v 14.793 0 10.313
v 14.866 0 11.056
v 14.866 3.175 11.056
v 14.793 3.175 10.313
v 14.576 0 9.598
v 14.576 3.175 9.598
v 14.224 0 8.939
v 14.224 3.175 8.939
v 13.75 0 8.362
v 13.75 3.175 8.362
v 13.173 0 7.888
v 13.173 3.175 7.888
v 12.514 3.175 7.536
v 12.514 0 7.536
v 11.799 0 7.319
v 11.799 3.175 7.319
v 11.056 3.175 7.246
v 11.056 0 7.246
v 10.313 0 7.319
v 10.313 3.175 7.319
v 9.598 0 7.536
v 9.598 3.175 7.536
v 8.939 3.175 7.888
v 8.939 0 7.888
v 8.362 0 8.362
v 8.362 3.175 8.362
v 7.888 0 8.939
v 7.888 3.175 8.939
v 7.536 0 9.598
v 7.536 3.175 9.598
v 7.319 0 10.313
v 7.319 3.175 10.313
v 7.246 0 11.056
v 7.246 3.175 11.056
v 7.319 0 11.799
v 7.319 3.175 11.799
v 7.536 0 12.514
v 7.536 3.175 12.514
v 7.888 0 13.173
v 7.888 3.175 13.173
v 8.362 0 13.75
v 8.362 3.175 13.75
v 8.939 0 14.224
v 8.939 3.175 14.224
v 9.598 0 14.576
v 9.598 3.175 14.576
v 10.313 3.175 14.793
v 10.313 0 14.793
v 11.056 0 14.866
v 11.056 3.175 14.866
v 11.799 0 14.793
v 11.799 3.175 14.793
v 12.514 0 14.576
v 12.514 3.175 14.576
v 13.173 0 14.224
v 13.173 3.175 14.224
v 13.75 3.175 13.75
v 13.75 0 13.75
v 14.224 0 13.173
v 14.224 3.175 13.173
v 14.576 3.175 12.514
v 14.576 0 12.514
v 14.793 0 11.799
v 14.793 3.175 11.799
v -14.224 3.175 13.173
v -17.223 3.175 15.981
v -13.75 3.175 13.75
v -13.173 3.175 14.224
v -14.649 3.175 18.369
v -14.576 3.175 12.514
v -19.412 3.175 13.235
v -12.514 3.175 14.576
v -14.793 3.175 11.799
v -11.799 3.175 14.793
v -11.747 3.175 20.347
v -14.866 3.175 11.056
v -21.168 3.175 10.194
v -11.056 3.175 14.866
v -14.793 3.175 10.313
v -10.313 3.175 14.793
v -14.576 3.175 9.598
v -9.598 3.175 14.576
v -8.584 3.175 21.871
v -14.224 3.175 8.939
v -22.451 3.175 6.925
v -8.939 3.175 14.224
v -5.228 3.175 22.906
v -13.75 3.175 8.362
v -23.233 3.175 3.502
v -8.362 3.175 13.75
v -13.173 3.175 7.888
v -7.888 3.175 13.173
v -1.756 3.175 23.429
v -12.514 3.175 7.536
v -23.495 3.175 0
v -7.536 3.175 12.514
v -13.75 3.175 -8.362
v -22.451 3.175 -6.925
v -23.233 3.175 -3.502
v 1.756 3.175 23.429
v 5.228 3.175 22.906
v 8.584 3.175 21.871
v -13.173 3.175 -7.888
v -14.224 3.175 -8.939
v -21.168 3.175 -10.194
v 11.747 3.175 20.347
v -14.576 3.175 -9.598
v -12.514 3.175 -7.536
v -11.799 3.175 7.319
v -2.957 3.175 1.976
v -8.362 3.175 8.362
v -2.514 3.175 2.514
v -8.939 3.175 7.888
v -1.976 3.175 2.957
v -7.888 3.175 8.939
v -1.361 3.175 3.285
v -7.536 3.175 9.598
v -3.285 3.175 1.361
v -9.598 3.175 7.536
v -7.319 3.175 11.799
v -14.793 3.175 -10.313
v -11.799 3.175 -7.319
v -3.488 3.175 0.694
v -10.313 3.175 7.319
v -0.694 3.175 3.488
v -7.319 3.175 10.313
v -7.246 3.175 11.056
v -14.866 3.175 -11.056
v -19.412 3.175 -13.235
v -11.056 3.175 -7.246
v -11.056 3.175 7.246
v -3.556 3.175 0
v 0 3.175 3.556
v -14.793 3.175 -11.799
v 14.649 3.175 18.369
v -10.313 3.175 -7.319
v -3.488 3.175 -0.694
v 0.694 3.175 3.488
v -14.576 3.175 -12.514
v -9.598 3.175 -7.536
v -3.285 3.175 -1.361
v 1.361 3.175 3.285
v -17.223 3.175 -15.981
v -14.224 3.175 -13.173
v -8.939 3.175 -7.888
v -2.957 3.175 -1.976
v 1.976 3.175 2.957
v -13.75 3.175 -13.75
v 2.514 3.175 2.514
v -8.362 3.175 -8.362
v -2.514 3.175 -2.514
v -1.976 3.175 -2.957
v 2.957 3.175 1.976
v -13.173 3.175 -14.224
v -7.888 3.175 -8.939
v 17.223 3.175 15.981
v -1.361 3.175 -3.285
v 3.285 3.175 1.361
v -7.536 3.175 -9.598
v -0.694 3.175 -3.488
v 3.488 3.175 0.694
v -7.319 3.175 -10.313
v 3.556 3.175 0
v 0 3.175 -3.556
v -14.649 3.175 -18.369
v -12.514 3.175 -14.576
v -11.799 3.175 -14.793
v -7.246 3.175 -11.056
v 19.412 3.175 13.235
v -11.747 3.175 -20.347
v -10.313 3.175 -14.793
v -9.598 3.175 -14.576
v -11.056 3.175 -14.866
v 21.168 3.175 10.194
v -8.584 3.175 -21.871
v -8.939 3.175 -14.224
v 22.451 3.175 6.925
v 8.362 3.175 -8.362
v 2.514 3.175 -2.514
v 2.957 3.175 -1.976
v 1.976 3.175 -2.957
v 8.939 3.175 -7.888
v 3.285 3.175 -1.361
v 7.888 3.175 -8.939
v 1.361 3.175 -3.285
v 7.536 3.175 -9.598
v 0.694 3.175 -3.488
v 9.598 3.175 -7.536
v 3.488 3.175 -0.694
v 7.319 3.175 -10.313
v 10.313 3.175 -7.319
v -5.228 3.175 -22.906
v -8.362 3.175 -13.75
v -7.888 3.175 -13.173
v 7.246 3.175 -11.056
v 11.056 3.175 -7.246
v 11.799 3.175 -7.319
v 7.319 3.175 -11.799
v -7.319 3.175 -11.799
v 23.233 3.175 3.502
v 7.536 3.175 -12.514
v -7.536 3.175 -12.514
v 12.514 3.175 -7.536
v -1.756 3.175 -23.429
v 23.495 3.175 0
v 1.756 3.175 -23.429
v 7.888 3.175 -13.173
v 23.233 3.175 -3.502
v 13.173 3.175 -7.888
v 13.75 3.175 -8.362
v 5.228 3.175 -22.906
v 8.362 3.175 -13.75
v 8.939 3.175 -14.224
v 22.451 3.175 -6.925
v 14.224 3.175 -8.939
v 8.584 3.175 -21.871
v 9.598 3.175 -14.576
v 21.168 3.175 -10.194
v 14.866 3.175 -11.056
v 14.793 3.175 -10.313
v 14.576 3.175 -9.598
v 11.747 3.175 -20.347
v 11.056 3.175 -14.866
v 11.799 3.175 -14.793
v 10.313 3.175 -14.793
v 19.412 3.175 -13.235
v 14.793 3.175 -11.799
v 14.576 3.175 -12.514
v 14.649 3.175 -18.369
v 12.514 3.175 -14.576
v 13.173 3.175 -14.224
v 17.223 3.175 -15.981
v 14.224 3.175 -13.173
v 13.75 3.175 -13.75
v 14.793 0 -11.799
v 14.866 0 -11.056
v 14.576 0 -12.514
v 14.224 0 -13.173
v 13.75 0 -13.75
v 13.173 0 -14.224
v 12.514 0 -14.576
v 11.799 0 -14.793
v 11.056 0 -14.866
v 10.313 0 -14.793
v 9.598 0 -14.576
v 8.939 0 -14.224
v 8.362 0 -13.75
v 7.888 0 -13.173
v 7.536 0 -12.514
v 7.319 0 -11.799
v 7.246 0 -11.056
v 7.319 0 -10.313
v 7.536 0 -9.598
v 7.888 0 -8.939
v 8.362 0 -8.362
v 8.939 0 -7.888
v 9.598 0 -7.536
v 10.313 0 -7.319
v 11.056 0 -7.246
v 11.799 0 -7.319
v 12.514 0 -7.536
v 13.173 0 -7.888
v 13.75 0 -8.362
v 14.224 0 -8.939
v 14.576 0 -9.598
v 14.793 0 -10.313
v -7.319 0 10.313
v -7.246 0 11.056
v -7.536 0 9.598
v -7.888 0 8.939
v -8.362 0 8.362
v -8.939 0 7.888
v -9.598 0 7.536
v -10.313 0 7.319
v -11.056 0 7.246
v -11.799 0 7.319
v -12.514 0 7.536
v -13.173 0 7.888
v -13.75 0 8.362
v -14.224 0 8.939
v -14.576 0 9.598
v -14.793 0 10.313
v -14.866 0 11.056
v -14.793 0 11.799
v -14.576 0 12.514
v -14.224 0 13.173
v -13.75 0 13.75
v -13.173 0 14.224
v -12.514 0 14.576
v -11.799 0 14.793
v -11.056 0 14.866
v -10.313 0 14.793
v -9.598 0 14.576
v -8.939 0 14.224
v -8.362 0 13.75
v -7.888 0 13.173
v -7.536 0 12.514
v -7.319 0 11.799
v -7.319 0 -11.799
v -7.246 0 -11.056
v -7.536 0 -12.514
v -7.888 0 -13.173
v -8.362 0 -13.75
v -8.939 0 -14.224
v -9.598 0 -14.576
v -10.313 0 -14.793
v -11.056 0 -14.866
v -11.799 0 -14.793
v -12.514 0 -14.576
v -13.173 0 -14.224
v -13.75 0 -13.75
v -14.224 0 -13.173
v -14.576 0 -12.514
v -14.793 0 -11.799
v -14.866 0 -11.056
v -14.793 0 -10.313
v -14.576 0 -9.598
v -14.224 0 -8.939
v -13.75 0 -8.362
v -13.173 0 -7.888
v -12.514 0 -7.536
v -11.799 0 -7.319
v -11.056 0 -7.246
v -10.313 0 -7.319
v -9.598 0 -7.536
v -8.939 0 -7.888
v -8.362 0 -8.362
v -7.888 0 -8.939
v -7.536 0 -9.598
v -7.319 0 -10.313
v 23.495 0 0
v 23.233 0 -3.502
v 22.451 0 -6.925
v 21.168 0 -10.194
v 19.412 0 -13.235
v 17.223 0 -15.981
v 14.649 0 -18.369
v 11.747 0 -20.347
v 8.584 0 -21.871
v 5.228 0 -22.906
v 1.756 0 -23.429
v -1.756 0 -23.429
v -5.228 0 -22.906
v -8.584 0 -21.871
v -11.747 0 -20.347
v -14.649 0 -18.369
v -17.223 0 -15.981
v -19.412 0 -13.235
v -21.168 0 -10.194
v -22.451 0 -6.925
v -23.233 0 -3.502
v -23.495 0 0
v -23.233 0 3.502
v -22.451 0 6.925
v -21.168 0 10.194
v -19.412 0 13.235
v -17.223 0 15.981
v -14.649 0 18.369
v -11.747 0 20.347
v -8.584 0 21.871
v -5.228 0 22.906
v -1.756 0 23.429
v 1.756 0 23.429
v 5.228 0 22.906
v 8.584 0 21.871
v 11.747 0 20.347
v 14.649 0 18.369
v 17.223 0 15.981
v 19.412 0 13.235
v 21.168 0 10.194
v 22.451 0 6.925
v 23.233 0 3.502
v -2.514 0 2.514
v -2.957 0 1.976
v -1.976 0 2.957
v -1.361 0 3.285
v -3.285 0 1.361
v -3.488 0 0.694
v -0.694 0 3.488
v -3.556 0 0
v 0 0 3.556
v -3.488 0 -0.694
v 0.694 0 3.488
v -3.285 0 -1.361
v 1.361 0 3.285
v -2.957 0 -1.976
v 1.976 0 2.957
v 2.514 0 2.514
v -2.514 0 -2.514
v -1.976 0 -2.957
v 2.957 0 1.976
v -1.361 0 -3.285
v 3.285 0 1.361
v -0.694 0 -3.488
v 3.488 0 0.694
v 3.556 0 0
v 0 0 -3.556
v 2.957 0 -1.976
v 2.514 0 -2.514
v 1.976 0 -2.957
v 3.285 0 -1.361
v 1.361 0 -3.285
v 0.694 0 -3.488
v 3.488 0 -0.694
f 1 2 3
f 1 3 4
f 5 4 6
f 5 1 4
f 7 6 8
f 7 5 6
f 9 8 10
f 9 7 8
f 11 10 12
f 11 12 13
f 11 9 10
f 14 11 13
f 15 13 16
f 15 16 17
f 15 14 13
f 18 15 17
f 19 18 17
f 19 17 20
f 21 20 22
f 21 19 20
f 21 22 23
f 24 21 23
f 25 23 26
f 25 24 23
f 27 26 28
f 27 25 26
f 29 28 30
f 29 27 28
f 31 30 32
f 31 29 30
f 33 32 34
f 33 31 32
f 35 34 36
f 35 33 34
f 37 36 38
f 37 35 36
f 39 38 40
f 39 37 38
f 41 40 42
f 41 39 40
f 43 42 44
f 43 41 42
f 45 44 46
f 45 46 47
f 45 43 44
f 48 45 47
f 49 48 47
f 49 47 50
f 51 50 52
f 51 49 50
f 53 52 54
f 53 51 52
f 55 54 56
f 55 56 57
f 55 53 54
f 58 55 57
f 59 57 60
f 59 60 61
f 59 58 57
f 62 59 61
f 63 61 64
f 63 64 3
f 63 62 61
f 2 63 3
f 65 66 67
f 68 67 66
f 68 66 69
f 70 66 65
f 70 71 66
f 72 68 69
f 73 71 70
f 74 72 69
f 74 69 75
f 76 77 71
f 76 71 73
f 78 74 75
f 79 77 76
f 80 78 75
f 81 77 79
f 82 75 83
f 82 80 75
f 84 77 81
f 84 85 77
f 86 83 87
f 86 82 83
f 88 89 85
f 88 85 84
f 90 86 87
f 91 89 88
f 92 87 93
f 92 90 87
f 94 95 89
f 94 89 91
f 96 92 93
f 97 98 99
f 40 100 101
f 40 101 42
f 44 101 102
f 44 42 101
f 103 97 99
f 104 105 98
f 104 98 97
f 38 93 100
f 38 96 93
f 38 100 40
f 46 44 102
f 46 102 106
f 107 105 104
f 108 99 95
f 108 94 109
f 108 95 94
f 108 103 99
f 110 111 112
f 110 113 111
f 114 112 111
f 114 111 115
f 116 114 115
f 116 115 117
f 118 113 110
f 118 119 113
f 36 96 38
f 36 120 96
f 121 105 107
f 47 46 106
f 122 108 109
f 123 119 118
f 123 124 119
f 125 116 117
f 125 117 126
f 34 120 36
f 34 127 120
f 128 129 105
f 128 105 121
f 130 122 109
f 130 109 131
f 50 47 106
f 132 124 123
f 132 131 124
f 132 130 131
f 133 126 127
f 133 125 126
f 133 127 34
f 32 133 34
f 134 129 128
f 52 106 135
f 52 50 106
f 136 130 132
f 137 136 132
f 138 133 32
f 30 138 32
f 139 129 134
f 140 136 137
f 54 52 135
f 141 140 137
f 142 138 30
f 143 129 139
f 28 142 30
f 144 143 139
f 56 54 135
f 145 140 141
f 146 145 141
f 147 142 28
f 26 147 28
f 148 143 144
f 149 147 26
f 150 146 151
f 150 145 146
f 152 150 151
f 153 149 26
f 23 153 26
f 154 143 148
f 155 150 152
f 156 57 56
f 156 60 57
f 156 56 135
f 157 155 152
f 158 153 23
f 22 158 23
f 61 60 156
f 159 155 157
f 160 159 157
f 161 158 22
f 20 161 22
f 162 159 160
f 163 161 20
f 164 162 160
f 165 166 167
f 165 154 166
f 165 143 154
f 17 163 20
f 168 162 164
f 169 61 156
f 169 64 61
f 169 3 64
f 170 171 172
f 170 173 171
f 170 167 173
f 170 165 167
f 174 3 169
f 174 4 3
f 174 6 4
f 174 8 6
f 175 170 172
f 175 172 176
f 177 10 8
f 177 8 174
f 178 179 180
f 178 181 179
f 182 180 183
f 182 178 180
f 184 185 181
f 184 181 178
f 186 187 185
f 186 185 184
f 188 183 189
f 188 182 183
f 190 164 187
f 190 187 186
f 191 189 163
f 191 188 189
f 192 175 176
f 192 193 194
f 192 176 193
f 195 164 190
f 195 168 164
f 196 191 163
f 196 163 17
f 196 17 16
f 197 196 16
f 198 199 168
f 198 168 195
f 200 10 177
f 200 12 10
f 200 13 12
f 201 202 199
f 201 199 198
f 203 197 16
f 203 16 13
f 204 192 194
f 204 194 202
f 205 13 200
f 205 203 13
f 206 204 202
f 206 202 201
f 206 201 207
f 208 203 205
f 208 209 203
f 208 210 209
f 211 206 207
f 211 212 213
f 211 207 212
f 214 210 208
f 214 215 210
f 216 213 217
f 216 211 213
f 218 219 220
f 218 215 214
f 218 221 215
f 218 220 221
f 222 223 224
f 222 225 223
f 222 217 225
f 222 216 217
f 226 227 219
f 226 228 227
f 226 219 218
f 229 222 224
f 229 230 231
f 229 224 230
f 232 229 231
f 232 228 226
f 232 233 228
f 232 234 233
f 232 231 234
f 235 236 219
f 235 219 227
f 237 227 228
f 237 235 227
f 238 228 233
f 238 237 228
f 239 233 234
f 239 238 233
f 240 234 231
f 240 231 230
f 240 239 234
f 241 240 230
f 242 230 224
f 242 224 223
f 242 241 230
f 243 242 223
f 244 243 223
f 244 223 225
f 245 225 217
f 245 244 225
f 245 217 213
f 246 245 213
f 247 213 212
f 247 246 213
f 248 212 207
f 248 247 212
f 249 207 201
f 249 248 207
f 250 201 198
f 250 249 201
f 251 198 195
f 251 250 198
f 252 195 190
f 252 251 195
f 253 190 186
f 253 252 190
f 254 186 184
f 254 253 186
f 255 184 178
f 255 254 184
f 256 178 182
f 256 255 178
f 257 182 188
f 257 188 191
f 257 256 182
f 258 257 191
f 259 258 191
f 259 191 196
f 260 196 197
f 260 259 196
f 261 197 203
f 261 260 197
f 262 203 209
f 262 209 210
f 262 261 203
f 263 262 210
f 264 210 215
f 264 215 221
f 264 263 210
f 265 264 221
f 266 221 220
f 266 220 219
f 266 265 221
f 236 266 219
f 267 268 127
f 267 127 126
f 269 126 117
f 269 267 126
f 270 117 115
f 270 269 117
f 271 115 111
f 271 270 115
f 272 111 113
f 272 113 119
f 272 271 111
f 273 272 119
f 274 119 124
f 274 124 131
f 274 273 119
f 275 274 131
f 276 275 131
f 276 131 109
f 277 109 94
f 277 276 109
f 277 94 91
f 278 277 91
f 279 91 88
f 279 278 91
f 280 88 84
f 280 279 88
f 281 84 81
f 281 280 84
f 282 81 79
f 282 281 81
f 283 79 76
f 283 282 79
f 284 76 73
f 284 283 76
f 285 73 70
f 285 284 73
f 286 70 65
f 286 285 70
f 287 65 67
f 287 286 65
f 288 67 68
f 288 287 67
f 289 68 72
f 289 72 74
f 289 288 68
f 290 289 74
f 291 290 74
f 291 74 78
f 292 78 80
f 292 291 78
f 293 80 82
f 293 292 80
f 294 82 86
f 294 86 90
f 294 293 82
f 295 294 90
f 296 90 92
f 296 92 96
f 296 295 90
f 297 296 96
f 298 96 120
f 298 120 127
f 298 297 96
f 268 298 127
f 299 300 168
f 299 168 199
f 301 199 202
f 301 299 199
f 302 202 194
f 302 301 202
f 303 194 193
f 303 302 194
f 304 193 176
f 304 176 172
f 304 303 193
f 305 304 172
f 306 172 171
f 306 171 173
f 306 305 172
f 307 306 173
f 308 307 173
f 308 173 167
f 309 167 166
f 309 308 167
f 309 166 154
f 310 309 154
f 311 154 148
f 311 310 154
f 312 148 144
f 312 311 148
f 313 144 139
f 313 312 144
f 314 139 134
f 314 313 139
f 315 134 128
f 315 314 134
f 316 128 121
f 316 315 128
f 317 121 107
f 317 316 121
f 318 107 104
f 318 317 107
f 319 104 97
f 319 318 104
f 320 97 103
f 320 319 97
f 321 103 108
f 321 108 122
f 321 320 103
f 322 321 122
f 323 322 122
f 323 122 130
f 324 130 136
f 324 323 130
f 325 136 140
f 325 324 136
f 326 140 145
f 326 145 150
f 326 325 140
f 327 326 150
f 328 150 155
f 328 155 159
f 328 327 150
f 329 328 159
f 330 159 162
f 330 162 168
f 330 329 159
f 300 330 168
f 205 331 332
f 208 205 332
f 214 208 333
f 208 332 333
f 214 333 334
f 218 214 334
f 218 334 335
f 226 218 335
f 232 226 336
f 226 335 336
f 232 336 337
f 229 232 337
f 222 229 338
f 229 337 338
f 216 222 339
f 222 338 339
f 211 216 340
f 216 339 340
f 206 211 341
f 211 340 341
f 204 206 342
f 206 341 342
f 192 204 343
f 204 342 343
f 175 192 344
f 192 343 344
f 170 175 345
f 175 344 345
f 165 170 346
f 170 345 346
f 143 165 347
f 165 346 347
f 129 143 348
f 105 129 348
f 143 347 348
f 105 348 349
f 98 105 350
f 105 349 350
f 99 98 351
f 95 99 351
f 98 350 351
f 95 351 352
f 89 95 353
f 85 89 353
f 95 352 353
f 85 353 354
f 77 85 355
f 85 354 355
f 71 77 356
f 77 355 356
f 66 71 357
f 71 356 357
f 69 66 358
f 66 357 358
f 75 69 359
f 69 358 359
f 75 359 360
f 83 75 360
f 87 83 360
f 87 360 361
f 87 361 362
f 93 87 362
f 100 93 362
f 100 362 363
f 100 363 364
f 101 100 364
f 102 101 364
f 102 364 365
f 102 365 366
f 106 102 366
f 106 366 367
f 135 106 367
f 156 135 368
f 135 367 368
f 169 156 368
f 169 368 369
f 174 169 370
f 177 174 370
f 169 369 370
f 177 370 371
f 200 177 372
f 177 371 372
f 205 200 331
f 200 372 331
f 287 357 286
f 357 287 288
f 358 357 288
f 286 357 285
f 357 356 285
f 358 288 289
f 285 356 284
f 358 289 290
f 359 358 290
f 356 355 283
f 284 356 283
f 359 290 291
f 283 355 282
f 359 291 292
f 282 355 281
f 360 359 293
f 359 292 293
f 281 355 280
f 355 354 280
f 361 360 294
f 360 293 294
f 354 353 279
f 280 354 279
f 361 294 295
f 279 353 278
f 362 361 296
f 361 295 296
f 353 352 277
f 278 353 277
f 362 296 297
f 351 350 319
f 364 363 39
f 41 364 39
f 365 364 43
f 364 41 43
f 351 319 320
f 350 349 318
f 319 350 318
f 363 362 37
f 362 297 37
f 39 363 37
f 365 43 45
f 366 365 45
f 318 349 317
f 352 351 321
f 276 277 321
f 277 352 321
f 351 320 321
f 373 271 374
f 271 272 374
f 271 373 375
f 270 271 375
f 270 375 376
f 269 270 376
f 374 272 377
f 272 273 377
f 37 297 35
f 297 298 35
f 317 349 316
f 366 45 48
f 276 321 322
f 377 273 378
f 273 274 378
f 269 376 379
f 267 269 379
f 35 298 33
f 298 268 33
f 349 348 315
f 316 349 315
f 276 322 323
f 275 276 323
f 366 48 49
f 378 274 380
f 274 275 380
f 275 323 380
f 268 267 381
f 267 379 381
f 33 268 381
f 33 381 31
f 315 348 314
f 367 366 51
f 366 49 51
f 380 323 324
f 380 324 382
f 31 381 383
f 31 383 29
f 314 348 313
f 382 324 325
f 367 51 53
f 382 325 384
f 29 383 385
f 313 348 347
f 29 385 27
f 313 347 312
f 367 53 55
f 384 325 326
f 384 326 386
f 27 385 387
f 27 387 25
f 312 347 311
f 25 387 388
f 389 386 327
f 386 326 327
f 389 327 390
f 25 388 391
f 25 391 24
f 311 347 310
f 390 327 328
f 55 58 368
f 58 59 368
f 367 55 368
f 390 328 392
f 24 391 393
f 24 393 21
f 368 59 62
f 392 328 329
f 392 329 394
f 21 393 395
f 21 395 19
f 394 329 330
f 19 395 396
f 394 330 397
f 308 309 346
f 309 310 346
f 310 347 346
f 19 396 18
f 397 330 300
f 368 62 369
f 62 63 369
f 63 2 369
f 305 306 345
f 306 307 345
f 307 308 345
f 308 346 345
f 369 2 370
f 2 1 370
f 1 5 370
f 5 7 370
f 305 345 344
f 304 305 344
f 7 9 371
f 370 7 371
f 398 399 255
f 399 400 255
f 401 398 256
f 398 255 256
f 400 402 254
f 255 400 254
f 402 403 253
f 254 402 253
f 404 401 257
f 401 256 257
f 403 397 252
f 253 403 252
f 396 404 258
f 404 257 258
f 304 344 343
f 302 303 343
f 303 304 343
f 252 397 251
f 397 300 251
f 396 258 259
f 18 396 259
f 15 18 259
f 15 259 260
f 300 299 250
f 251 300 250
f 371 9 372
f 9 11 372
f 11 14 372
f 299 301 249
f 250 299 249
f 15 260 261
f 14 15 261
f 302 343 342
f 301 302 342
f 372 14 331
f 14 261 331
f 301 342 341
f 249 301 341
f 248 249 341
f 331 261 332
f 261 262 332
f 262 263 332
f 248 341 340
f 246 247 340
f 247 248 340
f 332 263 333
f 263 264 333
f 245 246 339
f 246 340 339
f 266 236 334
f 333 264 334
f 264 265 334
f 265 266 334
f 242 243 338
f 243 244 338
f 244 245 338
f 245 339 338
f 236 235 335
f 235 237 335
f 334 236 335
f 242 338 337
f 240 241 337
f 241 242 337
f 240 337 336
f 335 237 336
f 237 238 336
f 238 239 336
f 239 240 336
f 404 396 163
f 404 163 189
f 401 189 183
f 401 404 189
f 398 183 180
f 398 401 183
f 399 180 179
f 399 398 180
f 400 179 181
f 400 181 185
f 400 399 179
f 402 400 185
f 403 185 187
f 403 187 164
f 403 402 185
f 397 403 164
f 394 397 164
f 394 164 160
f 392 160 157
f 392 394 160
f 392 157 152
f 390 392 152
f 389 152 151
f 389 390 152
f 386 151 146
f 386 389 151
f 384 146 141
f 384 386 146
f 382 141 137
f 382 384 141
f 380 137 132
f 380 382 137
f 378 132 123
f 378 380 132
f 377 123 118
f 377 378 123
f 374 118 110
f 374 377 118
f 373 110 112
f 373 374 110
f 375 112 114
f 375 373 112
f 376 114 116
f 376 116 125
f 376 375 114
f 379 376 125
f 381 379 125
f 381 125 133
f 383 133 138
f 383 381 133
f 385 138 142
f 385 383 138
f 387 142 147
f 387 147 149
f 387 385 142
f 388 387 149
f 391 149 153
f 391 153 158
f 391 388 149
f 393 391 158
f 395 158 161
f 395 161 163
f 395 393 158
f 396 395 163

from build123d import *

# Parameters (mm, degrees)
SKETCH1_R           = 23.495
SKETCH1_R_2         = 3.81
SKETCH1_R_3         = 3.556
BOSS_EXTRUDE1_DEPTH = 3.175


with BuildPart() as part:
    # Sketch1 → Boss-Extrude1 (new body)
    with BuildSketch(Plane(origin=(0, 0, 0), x_dir=(1, 0, 0), z_dir=(0, 1, 0))):
        Circle(SKETCH1_R)
        with Locations((-11.055868466, 11.055868466)):
            Circle(SKETCH1_R_2, mode=Mode.SUBTRACT)
        Circle(SKETCH1_R_3, mode=Mode.SUBTRACT)
        with Locations((11.055868466, -11.055868466)):
            Circle(SKETCH1_R_2, mode=Mode.SUBTRACT)
        with Locations((11.055868466, 11.055868466)):
            Circle(SKETCH1_R_2, mode=Mode.SUBTRACT)
        with Locations((-11.055868466, -11.055868466)):
            Circle(SKETCH1_R_2, mode=Mode.SUBTRACT)
    extrude(amount=BOSS_EXTRUDE1_DEPTH)


solid = part.part
